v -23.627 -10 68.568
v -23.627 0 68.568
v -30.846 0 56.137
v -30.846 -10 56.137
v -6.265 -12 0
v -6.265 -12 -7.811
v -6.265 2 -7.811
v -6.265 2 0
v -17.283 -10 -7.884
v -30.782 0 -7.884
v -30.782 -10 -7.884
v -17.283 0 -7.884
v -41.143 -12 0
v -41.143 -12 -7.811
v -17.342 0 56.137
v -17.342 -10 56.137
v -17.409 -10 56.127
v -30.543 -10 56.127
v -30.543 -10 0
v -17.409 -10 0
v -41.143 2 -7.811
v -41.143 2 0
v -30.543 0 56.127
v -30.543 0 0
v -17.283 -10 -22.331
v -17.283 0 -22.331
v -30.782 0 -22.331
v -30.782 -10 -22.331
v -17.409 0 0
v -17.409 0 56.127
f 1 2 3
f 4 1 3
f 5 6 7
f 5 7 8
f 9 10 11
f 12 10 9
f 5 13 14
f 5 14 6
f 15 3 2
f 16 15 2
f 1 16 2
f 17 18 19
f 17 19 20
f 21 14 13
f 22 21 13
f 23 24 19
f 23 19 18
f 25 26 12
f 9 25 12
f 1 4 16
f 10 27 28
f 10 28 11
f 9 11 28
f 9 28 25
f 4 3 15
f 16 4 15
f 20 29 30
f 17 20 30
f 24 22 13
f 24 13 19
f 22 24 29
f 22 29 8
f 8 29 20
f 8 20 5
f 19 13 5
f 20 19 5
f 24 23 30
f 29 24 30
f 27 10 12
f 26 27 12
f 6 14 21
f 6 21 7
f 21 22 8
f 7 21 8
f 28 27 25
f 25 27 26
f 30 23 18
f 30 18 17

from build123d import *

# Parameters (mm, degrees)
F3_DEPTH = 10
F2_W     = 13.4988240898
F2_H     = 14.4473891705
F1_W     = 34.8780401982
F1_H     = 7.810738869
F4_DEPTH = 12
F5_DEPTH = 2
F6_W     = 13.1339915097
F6_H     = 56.1272315681
F7_DEPTH = 10


# Not quite as in the source:
# - a feature names something its author has since deleted; it is built from what else it names


with BuildPart() as f3:
    # F0 (on Front) → F3 (new body)
    with BuildSketch(Plane.XZ):
        Polygon((-23.6272681504, 68.5679614544), (-30.8464840055, 56.137226522), (-17.3418466002, 56.137226522), align=None)
    extrude(amount=F3_DEPTH)


with BuildPart() as f3b:
    # F2 (on Front) → F3, piece 2 (new body)
    with BuildSketch(Plane.XZ):
        with Locations((-24.0321997553, -15.107399784)):
            Rectangle(F2_W, F2_H)
    extrude(amount=F3_DEPTH)


with BuildPart() as f4:
    # F1 (on Front) → F4 (new body)
    with BuildSketch(Plane.XZ):
        with Locations((-23.7038496416, -3.9053694345)):
            Rectangle(F1_W, F1_H)
    extrude(amount=F4_DEPTH)

    # F5 (add): a face of the model
    f5_faces = [f4.faces().sort_by_distance(p)[0] for p in [
        (-23.7038496416, 0, -3.9053694345),
    ]]
    extrude(f5_faces, amount=F5_DEPTH)

    # F6 (on Front) → F7 (join)
    with BuildSketch(Plane.XZ):
        with Locations((-23.975726217, 28.063615784)):
            Rectangle(F6_W, F6_H)
    extrude(amount=F7_DEPTH)


solid = Compound([f3.part, f3b.part, f4.part])
